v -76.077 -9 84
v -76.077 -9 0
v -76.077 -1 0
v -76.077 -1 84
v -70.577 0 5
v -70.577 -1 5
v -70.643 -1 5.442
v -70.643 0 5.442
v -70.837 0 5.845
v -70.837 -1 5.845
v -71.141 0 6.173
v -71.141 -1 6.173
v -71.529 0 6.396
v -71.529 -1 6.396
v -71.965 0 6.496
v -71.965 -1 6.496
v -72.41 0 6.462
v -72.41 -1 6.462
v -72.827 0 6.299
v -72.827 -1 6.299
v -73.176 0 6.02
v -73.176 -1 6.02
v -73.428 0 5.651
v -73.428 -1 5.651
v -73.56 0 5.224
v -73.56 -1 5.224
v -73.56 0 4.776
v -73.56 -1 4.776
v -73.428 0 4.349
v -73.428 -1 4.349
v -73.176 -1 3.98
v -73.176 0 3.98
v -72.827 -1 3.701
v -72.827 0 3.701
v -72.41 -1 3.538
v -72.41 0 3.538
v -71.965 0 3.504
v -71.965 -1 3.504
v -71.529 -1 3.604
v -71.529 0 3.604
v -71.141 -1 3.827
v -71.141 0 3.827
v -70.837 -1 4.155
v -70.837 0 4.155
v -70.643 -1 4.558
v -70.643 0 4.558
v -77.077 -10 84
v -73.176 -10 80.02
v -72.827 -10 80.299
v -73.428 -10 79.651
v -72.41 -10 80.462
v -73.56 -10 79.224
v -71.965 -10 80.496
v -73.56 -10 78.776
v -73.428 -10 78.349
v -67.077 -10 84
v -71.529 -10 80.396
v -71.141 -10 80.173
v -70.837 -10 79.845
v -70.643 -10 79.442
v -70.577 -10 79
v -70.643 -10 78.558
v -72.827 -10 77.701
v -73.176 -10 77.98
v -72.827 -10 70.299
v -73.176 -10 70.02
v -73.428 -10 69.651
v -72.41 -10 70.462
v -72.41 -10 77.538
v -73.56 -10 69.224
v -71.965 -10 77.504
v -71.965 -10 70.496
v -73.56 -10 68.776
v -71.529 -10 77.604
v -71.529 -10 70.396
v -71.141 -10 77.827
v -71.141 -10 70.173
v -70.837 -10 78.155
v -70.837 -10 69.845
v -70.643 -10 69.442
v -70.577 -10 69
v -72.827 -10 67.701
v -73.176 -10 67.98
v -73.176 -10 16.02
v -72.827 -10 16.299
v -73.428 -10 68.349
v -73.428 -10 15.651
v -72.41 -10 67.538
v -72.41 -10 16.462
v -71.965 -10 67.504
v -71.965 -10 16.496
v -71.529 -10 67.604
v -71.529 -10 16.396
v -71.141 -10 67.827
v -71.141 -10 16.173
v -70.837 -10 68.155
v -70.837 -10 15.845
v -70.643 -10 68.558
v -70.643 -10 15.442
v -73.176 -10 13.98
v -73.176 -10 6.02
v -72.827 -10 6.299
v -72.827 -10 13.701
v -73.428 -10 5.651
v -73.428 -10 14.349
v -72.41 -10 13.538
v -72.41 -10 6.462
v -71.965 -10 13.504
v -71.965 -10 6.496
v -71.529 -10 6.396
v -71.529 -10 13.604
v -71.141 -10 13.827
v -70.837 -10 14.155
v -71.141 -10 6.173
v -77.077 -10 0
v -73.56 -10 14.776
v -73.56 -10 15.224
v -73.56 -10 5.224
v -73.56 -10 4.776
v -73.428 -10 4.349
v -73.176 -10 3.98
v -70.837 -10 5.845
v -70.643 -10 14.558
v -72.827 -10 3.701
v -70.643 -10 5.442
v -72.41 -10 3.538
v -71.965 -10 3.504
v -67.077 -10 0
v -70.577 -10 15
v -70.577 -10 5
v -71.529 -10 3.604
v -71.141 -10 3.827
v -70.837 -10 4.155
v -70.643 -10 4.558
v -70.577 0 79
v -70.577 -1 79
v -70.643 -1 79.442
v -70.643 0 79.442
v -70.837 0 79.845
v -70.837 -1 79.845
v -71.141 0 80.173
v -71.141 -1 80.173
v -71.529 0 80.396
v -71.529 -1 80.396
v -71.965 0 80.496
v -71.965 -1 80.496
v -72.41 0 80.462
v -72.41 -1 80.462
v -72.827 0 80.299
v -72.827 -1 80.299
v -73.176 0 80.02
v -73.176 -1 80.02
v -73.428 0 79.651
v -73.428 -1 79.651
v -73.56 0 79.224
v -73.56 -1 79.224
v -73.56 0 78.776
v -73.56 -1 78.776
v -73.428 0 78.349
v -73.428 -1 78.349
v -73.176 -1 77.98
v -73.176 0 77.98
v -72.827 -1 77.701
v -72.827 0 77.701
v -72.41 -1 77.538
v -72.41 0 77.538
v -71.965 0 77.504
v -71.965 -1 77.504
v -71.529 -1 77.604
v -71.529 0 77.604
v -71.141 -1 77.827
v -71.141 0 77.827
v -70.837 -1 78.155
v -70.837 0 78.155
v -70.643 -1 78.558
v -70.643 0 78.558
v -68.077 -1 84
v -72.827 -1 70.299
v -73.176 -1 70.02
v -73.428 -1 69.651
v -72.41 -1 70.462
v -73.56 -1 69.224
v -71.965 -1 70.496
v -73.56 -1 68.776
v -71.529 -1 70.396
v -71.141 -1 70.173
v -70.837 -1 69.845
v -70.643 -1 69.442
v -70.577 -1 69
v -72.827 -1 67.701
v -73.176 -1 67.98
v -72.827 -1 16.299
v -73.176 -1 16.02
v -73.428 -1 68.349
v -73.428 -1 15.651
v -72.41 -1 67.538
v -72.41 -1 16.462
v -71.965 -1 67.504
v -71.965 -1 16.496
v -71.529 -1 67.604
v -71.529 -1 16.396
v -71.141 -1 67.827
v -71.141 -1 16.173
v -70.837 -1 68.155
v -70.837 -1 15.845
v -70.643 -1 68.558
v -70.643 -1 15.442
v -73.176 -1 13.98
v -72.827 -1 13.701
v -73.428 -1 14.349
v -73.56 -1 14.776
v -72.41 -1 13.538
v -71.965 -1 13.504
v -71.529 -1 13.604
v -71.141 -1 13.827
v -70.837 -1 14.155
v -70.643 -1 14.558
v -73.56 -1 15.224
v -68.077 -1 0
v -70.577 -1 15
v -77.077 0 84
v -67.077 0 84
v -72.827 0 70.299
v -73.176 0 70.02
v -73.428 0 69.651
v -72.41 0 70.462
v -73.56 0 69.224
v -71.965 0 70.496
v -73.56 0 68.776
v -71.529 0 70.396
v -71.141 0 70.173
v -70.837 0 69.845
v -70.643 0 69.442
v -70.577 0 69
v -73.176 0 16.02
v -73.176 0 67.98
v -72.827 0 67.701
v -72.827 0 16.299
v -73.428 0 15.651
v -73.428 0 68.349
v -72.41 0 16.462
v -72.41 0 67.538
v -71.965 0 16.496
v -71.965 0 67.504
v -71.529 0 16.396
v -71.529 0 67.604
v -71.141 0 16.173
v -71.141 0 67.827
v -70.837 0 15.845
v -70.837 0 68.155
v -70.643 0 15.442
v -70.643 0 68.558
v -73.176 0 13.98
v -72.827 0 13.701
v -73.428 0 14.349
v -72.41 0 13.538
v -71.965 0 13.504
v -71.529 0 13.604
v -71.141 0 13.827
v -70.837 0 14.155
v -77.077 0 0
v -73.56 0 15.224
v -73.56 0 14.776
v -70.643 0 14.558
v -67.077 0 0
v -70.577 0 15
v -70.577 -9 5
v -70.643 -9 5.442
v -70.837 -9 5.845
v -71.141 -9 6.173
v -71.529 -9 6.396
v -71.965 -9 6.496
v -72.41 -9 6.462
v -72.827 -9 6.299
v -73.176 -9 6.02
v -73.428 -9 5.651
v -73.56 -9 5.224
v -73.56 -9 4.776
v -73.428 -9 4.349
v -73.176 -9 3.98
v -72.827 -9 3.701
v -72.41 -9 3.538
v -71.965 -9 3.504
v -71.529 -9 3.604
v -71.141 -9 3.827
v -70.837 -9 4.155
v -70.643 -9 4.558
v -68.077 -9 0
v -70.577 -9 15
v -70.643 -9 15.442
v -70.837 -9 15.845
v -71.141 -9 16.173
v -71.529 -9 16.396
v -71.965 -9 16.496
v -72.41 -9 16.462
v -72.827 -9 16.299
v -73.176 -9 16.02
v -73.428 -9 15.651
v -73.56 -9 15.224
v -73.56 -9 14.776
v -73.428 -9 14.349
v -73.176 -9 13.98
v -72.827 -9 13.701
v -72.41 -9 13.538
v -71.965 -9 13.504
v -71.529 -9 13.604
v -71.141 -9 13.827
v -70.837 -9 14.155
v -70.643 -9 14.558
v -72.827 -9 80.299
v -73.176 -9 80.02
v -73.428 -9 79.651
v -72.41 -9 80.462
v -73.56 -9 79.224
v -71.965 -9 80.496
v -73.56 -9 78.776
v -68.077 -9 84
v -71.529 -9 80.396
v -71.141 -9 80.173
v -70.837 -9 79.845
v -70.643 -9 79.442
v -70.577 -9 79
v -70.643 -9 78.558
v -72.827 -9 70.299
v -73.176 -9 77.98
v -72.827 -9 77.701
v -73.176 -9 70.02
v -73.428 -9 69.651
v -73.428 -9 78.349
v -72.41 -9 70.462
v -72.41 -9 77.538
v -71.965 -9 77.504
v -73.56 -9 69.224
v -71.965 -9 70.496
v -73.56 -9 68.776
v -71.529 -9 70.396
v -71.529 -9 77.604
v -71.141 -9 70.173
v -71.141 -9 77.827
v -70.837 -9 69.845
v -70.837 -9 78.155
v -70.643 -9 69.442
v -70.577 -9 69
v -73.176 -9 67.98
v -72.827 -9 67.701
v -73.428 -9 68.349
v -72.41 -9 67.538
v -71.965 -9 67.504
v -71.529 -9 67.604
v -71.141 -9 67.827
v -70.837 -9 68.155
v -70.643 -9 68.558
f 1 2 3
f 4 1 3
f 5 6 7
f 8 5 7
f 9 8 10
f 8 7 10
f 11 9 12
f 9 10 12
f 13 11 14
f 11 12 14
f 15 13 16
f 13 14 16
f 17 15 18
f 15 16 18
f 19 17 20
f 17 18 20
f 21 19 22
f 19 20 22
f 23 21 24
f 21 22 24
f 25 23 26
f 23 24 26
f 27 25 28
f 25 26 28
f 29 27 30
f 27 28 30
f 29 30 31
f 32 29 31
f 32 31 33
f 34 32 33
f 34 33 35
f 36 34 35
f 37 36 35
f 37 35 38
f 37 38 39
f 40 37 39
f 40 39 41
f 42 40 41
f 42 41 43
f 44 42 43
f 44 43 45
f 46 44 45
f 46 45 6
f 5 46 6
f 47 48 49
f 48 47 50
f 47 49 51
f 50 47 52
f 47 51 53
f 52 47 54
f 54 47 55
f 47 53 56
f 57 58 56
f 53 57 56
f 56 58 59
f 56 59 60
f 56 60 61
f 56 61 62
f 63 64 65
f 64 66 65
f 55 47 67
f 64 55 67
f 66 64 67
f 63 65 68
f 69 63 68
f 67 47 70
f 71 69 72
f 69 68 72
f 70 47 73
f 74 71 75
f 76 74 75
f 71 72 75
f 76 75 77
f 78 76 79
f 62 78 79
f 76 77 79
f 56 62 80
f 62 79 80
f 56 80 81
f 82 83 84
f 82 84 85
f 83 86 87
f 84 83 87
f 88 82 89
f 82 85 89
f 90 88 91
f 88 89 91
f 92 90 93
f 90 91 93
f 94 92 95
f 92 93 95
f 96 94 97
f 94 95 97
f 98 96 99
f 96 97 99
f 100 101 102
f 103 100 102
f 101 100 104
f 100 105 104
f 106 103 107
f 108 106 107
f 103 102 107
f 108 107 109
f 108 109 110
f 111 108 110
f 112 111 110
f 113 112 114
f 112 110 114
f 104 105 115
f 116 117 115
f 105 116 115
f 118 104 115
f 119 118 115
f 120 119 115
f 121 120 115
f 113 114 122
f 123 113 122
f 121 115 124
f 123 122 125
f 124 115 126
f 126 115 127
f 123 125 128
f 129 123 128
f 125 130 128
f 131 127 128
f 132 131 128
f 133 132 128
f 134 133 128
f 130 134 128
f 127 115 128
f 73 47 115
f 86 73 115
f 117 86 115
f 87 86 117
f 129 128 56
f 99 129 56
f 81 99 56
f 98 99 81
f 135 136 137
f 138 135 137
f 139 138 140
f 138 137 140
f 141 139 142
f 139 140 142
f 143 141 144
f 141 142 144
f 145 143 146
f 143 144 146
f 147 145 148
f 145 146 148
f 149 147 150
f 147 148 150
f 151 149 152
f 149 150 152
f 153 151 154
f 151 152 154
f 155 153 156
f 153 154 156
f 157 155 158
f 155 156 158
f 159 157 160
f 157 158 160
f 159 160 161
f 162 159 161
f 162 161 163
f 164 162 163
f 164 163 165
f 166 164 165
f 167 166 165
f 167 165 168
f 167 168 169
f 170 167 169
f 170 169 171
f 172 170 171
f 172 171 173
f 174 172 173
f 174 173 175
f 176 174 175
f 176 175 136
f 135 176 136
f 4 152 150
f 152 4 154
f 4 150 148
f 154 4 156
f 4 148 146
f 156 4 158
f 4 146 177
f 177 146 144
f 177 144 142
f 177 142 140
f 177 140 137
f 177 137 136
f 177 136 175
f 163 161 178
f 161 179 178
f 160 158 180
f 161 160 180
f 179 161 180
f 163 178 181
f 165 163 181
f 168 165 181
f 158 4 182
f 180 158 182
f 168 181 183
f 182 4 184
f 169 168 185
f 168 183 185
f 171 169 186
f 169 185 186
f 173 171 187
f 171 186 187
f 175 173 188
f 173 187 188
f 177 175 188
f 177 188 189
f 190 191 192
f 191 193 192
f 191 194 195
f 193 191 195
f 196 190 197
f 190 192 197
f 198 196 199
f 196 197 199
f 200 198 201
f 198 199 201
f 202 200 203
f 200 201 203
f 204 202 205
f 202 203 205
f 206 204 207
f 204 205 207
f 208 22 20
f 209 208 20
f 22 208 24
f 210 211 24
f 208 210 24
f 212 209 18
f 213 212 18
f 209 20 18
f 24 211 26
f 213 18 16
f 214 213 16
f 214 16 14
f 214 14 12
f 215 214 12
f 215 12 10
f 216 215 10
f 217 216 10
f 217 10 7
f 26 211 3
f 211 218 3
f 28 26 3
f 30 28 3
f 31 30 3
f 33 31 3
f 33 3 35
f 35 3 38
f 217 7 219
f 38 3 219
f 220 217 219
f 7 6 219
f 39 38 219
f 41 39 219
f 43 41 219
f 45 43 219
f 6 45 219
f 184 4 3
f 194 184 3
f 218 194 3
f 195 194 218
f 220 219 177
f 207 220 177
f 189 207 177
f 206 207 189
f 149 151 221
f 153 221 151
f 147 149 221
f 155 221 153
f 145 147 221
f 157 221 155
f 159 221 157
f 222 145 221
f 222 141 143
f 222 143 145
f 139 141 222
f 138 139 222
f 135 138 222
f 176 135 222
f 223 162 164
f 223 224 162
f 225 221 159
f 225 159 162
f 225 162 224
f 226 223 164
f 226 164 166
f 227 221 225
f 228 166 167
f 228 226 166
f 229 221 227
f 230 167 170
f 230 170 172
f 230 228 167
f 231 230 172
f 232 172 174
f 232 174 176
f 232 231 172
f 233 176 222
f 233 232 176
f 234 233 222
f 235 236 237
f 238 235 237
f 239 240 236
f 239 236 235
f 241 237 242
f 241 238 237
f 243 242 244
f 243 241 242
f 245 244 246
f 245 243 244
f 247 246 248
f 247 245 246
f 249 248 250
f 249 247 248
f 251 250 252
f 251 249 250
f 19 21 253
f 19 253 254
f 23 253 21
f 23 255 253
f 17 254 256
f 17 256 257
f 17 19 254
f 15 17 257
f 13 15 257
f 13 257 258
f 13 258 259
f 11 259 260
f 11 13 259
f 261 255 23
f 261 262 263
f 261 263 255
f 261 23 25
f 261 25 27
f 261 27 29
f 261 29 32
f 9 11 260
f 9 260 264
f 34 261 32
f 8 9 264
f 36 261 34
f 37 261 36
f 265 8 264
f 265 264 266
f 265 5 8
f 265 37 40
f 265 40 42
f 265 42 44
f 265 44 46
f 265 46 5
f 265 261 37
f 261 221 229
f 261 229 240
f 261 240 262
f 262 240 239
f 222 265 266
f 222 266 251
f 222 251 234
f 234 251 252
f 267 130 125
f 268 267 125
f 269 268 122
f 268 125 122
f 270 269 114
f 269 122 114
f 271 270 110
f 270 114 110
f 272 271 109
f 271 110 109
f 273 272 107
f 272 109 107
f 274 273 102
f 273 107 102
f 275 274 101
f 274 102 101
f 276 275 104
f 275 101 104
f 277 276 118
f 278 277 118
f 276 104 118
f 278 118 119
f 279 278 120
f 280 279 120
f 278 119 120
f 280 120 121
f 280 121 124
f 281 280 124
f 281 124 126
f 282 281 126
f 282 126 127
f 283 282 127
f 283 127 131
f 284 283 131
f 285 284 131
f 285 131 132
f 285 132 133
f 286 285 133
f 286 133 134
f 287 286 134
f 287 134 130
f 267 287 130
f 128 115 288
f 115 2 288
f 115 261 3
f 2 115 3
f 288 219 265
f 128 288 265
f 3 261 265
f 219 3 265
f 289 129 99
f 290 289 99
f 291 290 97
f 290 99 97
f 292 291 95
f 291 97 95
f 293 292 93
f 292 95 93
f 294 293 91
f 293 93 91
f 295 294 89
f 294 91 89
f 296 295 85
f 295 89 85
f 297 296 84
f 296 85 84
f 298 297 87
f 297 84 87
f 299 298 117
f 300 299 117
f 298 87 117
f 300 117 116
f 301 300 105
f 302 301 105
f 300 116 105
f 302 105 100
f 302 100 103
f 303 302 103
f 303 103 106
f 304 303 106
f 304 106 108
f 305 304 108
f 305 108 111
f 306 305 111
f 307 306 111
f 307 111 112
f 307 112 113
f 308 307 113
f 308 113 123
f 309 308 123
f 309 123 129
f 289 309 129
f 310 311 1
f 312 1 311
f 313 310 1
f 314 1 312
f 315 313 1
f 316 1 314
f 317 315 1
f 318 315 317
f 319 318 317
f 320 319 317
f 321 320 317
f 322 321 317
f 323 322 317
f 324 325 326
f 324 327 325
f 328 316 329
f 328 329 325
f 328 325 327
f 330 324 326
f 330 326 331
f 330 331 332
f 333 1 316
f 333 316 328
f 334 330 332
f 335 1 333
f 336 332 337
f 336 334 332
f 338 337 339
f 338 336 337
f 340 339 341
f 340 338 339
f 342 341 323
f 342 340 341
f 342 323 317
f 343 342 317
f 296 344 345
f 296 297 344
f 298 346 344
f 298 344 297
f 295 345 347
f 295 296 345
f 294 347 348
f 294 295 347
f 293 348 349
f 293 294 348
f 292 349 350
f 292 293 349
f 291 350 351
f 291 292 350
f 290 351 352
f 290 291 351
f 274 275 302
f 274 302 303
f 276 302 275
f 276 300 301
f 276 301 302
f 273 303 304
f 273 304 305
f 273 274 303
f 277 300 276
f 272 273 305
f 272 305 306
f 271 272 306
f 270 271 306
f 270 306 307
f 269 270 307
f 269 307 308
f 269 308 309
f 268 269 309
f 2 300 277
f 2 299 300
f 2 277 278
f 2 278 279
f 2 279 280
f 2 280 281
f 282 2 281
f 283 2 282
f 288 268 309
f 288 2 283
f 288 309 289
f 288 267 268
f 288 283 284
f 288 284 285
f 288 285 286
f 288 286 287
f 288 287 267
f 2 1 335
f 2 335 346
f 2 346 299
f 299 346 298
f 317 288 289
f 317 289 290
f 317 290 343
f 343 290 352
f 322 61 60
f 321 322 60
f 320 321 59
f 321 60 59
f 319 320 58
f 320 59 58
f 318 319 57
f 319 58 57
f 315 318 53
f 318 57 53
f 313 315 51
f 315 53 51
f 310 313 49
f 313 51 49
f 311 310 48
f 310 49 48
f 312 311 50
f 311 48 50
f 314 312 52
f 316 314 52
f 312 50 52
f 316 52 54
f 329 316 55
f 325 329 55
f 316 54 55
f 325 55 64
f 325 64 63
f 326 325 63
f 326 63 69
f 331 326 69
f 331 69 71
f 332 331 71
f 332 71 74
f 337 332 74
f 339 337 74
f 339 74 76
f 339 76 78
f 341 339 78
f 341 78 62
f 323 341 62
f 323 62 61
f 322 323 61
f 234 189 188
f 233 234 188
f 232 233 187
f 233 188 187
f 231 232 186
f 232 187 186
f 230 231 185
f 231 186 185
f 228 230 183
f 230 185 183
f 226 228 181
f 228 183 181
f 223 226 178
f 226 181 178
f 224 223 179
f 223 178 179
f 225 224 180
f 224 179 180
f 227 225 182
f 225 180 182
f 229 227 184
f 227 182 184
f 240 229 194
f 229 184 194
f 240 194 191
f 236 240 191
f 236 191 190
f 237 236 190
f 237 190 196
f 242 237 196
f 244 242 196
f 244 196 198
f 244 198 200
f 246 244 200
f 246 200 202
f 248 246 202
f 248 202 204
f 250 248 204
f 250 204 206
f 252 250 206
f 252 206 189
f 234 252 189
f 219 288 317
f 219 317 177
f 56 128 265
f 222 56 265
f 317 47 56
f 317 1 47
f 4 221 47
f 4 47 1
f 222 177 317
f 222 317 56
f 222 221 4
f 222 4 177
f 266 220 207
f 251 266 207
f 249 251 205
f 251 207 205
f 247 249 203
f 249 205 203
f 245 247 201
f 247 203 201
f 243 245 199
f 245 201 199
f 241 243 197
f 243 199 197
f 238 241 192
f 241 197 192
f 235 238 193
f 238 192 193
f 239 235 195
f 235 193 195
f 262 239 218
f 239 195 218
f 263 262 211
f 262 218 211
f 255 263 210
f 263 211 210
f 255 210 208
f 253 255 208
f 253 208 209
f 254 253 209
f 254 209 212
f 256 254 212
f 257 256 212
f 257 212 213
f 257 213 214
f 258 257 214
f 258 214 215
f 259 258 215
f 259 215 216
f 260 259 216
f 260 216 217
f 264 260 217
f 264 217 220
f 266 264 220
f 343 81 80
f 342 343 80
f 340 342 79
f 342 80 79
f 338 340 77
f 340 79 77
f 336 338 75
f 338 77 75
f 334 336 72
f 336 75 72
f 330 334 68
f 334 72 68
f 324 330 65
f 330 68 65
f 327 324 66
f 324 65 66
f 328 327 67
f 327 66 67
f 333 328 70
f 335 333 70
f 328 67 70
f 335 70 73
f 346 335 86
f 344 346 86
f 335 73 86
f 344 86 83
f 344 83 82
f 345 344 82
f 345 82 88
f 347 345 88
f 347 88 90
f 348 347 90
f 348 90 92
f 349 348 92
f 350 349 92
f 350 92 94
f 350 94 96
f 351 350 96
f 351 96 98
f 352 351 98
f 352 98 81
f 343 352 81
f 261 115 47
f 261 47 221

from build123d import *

# Parameters (mm, degrees)
SKETCH_1_W          = 10
SKETCH_1_H          = 10
SKETCH_1_W_2        = 8
SKETCH_1_H_2        = 8
EXTRUDE_1_DEPTH     = 84
SKETCH_3_R          = 1.5
CUT_EXTRUDE_2_DEPTH = 10


with BuildPart() as part:
    # 草图1 → 拉伸-薄壁1 (new body)
    with BuildSketch(Plane.XY):
        with Locations((-72.076665045, -5)):
            Rectangle(SKETCH_1_W, SKETCH_1_H)
        with Locations((-72.076665045, -5)):
            Rectangle(SKETCH_1_W_2, SKETCH_1_H_2, mode=Mode.SUBTRACT)
    extrude(amount=EXTRUDE_1_DEPTH)

    # 草图3 → 切除-拉伸2 (cut)
    with BuildSketch(Plane.XZ.offset(10)):
        with Locations((-72.076665045, 5)):
            Circle(SKETCH_3_R)
        with Locations((-72.076665045, 79)):
            Circle(SKETCH_3_R)
        with Locations((-72.076665045, 69)):
            Circle(SKETCH_3_R)
        with Locations((-72.076665045, 15)):
            Circle(SKETCH_3_R)
    extrude(amount=-CUT_EXTRUDE_2_DEPTH, mode=Mode.SUBTRACT)


solid = part.part
